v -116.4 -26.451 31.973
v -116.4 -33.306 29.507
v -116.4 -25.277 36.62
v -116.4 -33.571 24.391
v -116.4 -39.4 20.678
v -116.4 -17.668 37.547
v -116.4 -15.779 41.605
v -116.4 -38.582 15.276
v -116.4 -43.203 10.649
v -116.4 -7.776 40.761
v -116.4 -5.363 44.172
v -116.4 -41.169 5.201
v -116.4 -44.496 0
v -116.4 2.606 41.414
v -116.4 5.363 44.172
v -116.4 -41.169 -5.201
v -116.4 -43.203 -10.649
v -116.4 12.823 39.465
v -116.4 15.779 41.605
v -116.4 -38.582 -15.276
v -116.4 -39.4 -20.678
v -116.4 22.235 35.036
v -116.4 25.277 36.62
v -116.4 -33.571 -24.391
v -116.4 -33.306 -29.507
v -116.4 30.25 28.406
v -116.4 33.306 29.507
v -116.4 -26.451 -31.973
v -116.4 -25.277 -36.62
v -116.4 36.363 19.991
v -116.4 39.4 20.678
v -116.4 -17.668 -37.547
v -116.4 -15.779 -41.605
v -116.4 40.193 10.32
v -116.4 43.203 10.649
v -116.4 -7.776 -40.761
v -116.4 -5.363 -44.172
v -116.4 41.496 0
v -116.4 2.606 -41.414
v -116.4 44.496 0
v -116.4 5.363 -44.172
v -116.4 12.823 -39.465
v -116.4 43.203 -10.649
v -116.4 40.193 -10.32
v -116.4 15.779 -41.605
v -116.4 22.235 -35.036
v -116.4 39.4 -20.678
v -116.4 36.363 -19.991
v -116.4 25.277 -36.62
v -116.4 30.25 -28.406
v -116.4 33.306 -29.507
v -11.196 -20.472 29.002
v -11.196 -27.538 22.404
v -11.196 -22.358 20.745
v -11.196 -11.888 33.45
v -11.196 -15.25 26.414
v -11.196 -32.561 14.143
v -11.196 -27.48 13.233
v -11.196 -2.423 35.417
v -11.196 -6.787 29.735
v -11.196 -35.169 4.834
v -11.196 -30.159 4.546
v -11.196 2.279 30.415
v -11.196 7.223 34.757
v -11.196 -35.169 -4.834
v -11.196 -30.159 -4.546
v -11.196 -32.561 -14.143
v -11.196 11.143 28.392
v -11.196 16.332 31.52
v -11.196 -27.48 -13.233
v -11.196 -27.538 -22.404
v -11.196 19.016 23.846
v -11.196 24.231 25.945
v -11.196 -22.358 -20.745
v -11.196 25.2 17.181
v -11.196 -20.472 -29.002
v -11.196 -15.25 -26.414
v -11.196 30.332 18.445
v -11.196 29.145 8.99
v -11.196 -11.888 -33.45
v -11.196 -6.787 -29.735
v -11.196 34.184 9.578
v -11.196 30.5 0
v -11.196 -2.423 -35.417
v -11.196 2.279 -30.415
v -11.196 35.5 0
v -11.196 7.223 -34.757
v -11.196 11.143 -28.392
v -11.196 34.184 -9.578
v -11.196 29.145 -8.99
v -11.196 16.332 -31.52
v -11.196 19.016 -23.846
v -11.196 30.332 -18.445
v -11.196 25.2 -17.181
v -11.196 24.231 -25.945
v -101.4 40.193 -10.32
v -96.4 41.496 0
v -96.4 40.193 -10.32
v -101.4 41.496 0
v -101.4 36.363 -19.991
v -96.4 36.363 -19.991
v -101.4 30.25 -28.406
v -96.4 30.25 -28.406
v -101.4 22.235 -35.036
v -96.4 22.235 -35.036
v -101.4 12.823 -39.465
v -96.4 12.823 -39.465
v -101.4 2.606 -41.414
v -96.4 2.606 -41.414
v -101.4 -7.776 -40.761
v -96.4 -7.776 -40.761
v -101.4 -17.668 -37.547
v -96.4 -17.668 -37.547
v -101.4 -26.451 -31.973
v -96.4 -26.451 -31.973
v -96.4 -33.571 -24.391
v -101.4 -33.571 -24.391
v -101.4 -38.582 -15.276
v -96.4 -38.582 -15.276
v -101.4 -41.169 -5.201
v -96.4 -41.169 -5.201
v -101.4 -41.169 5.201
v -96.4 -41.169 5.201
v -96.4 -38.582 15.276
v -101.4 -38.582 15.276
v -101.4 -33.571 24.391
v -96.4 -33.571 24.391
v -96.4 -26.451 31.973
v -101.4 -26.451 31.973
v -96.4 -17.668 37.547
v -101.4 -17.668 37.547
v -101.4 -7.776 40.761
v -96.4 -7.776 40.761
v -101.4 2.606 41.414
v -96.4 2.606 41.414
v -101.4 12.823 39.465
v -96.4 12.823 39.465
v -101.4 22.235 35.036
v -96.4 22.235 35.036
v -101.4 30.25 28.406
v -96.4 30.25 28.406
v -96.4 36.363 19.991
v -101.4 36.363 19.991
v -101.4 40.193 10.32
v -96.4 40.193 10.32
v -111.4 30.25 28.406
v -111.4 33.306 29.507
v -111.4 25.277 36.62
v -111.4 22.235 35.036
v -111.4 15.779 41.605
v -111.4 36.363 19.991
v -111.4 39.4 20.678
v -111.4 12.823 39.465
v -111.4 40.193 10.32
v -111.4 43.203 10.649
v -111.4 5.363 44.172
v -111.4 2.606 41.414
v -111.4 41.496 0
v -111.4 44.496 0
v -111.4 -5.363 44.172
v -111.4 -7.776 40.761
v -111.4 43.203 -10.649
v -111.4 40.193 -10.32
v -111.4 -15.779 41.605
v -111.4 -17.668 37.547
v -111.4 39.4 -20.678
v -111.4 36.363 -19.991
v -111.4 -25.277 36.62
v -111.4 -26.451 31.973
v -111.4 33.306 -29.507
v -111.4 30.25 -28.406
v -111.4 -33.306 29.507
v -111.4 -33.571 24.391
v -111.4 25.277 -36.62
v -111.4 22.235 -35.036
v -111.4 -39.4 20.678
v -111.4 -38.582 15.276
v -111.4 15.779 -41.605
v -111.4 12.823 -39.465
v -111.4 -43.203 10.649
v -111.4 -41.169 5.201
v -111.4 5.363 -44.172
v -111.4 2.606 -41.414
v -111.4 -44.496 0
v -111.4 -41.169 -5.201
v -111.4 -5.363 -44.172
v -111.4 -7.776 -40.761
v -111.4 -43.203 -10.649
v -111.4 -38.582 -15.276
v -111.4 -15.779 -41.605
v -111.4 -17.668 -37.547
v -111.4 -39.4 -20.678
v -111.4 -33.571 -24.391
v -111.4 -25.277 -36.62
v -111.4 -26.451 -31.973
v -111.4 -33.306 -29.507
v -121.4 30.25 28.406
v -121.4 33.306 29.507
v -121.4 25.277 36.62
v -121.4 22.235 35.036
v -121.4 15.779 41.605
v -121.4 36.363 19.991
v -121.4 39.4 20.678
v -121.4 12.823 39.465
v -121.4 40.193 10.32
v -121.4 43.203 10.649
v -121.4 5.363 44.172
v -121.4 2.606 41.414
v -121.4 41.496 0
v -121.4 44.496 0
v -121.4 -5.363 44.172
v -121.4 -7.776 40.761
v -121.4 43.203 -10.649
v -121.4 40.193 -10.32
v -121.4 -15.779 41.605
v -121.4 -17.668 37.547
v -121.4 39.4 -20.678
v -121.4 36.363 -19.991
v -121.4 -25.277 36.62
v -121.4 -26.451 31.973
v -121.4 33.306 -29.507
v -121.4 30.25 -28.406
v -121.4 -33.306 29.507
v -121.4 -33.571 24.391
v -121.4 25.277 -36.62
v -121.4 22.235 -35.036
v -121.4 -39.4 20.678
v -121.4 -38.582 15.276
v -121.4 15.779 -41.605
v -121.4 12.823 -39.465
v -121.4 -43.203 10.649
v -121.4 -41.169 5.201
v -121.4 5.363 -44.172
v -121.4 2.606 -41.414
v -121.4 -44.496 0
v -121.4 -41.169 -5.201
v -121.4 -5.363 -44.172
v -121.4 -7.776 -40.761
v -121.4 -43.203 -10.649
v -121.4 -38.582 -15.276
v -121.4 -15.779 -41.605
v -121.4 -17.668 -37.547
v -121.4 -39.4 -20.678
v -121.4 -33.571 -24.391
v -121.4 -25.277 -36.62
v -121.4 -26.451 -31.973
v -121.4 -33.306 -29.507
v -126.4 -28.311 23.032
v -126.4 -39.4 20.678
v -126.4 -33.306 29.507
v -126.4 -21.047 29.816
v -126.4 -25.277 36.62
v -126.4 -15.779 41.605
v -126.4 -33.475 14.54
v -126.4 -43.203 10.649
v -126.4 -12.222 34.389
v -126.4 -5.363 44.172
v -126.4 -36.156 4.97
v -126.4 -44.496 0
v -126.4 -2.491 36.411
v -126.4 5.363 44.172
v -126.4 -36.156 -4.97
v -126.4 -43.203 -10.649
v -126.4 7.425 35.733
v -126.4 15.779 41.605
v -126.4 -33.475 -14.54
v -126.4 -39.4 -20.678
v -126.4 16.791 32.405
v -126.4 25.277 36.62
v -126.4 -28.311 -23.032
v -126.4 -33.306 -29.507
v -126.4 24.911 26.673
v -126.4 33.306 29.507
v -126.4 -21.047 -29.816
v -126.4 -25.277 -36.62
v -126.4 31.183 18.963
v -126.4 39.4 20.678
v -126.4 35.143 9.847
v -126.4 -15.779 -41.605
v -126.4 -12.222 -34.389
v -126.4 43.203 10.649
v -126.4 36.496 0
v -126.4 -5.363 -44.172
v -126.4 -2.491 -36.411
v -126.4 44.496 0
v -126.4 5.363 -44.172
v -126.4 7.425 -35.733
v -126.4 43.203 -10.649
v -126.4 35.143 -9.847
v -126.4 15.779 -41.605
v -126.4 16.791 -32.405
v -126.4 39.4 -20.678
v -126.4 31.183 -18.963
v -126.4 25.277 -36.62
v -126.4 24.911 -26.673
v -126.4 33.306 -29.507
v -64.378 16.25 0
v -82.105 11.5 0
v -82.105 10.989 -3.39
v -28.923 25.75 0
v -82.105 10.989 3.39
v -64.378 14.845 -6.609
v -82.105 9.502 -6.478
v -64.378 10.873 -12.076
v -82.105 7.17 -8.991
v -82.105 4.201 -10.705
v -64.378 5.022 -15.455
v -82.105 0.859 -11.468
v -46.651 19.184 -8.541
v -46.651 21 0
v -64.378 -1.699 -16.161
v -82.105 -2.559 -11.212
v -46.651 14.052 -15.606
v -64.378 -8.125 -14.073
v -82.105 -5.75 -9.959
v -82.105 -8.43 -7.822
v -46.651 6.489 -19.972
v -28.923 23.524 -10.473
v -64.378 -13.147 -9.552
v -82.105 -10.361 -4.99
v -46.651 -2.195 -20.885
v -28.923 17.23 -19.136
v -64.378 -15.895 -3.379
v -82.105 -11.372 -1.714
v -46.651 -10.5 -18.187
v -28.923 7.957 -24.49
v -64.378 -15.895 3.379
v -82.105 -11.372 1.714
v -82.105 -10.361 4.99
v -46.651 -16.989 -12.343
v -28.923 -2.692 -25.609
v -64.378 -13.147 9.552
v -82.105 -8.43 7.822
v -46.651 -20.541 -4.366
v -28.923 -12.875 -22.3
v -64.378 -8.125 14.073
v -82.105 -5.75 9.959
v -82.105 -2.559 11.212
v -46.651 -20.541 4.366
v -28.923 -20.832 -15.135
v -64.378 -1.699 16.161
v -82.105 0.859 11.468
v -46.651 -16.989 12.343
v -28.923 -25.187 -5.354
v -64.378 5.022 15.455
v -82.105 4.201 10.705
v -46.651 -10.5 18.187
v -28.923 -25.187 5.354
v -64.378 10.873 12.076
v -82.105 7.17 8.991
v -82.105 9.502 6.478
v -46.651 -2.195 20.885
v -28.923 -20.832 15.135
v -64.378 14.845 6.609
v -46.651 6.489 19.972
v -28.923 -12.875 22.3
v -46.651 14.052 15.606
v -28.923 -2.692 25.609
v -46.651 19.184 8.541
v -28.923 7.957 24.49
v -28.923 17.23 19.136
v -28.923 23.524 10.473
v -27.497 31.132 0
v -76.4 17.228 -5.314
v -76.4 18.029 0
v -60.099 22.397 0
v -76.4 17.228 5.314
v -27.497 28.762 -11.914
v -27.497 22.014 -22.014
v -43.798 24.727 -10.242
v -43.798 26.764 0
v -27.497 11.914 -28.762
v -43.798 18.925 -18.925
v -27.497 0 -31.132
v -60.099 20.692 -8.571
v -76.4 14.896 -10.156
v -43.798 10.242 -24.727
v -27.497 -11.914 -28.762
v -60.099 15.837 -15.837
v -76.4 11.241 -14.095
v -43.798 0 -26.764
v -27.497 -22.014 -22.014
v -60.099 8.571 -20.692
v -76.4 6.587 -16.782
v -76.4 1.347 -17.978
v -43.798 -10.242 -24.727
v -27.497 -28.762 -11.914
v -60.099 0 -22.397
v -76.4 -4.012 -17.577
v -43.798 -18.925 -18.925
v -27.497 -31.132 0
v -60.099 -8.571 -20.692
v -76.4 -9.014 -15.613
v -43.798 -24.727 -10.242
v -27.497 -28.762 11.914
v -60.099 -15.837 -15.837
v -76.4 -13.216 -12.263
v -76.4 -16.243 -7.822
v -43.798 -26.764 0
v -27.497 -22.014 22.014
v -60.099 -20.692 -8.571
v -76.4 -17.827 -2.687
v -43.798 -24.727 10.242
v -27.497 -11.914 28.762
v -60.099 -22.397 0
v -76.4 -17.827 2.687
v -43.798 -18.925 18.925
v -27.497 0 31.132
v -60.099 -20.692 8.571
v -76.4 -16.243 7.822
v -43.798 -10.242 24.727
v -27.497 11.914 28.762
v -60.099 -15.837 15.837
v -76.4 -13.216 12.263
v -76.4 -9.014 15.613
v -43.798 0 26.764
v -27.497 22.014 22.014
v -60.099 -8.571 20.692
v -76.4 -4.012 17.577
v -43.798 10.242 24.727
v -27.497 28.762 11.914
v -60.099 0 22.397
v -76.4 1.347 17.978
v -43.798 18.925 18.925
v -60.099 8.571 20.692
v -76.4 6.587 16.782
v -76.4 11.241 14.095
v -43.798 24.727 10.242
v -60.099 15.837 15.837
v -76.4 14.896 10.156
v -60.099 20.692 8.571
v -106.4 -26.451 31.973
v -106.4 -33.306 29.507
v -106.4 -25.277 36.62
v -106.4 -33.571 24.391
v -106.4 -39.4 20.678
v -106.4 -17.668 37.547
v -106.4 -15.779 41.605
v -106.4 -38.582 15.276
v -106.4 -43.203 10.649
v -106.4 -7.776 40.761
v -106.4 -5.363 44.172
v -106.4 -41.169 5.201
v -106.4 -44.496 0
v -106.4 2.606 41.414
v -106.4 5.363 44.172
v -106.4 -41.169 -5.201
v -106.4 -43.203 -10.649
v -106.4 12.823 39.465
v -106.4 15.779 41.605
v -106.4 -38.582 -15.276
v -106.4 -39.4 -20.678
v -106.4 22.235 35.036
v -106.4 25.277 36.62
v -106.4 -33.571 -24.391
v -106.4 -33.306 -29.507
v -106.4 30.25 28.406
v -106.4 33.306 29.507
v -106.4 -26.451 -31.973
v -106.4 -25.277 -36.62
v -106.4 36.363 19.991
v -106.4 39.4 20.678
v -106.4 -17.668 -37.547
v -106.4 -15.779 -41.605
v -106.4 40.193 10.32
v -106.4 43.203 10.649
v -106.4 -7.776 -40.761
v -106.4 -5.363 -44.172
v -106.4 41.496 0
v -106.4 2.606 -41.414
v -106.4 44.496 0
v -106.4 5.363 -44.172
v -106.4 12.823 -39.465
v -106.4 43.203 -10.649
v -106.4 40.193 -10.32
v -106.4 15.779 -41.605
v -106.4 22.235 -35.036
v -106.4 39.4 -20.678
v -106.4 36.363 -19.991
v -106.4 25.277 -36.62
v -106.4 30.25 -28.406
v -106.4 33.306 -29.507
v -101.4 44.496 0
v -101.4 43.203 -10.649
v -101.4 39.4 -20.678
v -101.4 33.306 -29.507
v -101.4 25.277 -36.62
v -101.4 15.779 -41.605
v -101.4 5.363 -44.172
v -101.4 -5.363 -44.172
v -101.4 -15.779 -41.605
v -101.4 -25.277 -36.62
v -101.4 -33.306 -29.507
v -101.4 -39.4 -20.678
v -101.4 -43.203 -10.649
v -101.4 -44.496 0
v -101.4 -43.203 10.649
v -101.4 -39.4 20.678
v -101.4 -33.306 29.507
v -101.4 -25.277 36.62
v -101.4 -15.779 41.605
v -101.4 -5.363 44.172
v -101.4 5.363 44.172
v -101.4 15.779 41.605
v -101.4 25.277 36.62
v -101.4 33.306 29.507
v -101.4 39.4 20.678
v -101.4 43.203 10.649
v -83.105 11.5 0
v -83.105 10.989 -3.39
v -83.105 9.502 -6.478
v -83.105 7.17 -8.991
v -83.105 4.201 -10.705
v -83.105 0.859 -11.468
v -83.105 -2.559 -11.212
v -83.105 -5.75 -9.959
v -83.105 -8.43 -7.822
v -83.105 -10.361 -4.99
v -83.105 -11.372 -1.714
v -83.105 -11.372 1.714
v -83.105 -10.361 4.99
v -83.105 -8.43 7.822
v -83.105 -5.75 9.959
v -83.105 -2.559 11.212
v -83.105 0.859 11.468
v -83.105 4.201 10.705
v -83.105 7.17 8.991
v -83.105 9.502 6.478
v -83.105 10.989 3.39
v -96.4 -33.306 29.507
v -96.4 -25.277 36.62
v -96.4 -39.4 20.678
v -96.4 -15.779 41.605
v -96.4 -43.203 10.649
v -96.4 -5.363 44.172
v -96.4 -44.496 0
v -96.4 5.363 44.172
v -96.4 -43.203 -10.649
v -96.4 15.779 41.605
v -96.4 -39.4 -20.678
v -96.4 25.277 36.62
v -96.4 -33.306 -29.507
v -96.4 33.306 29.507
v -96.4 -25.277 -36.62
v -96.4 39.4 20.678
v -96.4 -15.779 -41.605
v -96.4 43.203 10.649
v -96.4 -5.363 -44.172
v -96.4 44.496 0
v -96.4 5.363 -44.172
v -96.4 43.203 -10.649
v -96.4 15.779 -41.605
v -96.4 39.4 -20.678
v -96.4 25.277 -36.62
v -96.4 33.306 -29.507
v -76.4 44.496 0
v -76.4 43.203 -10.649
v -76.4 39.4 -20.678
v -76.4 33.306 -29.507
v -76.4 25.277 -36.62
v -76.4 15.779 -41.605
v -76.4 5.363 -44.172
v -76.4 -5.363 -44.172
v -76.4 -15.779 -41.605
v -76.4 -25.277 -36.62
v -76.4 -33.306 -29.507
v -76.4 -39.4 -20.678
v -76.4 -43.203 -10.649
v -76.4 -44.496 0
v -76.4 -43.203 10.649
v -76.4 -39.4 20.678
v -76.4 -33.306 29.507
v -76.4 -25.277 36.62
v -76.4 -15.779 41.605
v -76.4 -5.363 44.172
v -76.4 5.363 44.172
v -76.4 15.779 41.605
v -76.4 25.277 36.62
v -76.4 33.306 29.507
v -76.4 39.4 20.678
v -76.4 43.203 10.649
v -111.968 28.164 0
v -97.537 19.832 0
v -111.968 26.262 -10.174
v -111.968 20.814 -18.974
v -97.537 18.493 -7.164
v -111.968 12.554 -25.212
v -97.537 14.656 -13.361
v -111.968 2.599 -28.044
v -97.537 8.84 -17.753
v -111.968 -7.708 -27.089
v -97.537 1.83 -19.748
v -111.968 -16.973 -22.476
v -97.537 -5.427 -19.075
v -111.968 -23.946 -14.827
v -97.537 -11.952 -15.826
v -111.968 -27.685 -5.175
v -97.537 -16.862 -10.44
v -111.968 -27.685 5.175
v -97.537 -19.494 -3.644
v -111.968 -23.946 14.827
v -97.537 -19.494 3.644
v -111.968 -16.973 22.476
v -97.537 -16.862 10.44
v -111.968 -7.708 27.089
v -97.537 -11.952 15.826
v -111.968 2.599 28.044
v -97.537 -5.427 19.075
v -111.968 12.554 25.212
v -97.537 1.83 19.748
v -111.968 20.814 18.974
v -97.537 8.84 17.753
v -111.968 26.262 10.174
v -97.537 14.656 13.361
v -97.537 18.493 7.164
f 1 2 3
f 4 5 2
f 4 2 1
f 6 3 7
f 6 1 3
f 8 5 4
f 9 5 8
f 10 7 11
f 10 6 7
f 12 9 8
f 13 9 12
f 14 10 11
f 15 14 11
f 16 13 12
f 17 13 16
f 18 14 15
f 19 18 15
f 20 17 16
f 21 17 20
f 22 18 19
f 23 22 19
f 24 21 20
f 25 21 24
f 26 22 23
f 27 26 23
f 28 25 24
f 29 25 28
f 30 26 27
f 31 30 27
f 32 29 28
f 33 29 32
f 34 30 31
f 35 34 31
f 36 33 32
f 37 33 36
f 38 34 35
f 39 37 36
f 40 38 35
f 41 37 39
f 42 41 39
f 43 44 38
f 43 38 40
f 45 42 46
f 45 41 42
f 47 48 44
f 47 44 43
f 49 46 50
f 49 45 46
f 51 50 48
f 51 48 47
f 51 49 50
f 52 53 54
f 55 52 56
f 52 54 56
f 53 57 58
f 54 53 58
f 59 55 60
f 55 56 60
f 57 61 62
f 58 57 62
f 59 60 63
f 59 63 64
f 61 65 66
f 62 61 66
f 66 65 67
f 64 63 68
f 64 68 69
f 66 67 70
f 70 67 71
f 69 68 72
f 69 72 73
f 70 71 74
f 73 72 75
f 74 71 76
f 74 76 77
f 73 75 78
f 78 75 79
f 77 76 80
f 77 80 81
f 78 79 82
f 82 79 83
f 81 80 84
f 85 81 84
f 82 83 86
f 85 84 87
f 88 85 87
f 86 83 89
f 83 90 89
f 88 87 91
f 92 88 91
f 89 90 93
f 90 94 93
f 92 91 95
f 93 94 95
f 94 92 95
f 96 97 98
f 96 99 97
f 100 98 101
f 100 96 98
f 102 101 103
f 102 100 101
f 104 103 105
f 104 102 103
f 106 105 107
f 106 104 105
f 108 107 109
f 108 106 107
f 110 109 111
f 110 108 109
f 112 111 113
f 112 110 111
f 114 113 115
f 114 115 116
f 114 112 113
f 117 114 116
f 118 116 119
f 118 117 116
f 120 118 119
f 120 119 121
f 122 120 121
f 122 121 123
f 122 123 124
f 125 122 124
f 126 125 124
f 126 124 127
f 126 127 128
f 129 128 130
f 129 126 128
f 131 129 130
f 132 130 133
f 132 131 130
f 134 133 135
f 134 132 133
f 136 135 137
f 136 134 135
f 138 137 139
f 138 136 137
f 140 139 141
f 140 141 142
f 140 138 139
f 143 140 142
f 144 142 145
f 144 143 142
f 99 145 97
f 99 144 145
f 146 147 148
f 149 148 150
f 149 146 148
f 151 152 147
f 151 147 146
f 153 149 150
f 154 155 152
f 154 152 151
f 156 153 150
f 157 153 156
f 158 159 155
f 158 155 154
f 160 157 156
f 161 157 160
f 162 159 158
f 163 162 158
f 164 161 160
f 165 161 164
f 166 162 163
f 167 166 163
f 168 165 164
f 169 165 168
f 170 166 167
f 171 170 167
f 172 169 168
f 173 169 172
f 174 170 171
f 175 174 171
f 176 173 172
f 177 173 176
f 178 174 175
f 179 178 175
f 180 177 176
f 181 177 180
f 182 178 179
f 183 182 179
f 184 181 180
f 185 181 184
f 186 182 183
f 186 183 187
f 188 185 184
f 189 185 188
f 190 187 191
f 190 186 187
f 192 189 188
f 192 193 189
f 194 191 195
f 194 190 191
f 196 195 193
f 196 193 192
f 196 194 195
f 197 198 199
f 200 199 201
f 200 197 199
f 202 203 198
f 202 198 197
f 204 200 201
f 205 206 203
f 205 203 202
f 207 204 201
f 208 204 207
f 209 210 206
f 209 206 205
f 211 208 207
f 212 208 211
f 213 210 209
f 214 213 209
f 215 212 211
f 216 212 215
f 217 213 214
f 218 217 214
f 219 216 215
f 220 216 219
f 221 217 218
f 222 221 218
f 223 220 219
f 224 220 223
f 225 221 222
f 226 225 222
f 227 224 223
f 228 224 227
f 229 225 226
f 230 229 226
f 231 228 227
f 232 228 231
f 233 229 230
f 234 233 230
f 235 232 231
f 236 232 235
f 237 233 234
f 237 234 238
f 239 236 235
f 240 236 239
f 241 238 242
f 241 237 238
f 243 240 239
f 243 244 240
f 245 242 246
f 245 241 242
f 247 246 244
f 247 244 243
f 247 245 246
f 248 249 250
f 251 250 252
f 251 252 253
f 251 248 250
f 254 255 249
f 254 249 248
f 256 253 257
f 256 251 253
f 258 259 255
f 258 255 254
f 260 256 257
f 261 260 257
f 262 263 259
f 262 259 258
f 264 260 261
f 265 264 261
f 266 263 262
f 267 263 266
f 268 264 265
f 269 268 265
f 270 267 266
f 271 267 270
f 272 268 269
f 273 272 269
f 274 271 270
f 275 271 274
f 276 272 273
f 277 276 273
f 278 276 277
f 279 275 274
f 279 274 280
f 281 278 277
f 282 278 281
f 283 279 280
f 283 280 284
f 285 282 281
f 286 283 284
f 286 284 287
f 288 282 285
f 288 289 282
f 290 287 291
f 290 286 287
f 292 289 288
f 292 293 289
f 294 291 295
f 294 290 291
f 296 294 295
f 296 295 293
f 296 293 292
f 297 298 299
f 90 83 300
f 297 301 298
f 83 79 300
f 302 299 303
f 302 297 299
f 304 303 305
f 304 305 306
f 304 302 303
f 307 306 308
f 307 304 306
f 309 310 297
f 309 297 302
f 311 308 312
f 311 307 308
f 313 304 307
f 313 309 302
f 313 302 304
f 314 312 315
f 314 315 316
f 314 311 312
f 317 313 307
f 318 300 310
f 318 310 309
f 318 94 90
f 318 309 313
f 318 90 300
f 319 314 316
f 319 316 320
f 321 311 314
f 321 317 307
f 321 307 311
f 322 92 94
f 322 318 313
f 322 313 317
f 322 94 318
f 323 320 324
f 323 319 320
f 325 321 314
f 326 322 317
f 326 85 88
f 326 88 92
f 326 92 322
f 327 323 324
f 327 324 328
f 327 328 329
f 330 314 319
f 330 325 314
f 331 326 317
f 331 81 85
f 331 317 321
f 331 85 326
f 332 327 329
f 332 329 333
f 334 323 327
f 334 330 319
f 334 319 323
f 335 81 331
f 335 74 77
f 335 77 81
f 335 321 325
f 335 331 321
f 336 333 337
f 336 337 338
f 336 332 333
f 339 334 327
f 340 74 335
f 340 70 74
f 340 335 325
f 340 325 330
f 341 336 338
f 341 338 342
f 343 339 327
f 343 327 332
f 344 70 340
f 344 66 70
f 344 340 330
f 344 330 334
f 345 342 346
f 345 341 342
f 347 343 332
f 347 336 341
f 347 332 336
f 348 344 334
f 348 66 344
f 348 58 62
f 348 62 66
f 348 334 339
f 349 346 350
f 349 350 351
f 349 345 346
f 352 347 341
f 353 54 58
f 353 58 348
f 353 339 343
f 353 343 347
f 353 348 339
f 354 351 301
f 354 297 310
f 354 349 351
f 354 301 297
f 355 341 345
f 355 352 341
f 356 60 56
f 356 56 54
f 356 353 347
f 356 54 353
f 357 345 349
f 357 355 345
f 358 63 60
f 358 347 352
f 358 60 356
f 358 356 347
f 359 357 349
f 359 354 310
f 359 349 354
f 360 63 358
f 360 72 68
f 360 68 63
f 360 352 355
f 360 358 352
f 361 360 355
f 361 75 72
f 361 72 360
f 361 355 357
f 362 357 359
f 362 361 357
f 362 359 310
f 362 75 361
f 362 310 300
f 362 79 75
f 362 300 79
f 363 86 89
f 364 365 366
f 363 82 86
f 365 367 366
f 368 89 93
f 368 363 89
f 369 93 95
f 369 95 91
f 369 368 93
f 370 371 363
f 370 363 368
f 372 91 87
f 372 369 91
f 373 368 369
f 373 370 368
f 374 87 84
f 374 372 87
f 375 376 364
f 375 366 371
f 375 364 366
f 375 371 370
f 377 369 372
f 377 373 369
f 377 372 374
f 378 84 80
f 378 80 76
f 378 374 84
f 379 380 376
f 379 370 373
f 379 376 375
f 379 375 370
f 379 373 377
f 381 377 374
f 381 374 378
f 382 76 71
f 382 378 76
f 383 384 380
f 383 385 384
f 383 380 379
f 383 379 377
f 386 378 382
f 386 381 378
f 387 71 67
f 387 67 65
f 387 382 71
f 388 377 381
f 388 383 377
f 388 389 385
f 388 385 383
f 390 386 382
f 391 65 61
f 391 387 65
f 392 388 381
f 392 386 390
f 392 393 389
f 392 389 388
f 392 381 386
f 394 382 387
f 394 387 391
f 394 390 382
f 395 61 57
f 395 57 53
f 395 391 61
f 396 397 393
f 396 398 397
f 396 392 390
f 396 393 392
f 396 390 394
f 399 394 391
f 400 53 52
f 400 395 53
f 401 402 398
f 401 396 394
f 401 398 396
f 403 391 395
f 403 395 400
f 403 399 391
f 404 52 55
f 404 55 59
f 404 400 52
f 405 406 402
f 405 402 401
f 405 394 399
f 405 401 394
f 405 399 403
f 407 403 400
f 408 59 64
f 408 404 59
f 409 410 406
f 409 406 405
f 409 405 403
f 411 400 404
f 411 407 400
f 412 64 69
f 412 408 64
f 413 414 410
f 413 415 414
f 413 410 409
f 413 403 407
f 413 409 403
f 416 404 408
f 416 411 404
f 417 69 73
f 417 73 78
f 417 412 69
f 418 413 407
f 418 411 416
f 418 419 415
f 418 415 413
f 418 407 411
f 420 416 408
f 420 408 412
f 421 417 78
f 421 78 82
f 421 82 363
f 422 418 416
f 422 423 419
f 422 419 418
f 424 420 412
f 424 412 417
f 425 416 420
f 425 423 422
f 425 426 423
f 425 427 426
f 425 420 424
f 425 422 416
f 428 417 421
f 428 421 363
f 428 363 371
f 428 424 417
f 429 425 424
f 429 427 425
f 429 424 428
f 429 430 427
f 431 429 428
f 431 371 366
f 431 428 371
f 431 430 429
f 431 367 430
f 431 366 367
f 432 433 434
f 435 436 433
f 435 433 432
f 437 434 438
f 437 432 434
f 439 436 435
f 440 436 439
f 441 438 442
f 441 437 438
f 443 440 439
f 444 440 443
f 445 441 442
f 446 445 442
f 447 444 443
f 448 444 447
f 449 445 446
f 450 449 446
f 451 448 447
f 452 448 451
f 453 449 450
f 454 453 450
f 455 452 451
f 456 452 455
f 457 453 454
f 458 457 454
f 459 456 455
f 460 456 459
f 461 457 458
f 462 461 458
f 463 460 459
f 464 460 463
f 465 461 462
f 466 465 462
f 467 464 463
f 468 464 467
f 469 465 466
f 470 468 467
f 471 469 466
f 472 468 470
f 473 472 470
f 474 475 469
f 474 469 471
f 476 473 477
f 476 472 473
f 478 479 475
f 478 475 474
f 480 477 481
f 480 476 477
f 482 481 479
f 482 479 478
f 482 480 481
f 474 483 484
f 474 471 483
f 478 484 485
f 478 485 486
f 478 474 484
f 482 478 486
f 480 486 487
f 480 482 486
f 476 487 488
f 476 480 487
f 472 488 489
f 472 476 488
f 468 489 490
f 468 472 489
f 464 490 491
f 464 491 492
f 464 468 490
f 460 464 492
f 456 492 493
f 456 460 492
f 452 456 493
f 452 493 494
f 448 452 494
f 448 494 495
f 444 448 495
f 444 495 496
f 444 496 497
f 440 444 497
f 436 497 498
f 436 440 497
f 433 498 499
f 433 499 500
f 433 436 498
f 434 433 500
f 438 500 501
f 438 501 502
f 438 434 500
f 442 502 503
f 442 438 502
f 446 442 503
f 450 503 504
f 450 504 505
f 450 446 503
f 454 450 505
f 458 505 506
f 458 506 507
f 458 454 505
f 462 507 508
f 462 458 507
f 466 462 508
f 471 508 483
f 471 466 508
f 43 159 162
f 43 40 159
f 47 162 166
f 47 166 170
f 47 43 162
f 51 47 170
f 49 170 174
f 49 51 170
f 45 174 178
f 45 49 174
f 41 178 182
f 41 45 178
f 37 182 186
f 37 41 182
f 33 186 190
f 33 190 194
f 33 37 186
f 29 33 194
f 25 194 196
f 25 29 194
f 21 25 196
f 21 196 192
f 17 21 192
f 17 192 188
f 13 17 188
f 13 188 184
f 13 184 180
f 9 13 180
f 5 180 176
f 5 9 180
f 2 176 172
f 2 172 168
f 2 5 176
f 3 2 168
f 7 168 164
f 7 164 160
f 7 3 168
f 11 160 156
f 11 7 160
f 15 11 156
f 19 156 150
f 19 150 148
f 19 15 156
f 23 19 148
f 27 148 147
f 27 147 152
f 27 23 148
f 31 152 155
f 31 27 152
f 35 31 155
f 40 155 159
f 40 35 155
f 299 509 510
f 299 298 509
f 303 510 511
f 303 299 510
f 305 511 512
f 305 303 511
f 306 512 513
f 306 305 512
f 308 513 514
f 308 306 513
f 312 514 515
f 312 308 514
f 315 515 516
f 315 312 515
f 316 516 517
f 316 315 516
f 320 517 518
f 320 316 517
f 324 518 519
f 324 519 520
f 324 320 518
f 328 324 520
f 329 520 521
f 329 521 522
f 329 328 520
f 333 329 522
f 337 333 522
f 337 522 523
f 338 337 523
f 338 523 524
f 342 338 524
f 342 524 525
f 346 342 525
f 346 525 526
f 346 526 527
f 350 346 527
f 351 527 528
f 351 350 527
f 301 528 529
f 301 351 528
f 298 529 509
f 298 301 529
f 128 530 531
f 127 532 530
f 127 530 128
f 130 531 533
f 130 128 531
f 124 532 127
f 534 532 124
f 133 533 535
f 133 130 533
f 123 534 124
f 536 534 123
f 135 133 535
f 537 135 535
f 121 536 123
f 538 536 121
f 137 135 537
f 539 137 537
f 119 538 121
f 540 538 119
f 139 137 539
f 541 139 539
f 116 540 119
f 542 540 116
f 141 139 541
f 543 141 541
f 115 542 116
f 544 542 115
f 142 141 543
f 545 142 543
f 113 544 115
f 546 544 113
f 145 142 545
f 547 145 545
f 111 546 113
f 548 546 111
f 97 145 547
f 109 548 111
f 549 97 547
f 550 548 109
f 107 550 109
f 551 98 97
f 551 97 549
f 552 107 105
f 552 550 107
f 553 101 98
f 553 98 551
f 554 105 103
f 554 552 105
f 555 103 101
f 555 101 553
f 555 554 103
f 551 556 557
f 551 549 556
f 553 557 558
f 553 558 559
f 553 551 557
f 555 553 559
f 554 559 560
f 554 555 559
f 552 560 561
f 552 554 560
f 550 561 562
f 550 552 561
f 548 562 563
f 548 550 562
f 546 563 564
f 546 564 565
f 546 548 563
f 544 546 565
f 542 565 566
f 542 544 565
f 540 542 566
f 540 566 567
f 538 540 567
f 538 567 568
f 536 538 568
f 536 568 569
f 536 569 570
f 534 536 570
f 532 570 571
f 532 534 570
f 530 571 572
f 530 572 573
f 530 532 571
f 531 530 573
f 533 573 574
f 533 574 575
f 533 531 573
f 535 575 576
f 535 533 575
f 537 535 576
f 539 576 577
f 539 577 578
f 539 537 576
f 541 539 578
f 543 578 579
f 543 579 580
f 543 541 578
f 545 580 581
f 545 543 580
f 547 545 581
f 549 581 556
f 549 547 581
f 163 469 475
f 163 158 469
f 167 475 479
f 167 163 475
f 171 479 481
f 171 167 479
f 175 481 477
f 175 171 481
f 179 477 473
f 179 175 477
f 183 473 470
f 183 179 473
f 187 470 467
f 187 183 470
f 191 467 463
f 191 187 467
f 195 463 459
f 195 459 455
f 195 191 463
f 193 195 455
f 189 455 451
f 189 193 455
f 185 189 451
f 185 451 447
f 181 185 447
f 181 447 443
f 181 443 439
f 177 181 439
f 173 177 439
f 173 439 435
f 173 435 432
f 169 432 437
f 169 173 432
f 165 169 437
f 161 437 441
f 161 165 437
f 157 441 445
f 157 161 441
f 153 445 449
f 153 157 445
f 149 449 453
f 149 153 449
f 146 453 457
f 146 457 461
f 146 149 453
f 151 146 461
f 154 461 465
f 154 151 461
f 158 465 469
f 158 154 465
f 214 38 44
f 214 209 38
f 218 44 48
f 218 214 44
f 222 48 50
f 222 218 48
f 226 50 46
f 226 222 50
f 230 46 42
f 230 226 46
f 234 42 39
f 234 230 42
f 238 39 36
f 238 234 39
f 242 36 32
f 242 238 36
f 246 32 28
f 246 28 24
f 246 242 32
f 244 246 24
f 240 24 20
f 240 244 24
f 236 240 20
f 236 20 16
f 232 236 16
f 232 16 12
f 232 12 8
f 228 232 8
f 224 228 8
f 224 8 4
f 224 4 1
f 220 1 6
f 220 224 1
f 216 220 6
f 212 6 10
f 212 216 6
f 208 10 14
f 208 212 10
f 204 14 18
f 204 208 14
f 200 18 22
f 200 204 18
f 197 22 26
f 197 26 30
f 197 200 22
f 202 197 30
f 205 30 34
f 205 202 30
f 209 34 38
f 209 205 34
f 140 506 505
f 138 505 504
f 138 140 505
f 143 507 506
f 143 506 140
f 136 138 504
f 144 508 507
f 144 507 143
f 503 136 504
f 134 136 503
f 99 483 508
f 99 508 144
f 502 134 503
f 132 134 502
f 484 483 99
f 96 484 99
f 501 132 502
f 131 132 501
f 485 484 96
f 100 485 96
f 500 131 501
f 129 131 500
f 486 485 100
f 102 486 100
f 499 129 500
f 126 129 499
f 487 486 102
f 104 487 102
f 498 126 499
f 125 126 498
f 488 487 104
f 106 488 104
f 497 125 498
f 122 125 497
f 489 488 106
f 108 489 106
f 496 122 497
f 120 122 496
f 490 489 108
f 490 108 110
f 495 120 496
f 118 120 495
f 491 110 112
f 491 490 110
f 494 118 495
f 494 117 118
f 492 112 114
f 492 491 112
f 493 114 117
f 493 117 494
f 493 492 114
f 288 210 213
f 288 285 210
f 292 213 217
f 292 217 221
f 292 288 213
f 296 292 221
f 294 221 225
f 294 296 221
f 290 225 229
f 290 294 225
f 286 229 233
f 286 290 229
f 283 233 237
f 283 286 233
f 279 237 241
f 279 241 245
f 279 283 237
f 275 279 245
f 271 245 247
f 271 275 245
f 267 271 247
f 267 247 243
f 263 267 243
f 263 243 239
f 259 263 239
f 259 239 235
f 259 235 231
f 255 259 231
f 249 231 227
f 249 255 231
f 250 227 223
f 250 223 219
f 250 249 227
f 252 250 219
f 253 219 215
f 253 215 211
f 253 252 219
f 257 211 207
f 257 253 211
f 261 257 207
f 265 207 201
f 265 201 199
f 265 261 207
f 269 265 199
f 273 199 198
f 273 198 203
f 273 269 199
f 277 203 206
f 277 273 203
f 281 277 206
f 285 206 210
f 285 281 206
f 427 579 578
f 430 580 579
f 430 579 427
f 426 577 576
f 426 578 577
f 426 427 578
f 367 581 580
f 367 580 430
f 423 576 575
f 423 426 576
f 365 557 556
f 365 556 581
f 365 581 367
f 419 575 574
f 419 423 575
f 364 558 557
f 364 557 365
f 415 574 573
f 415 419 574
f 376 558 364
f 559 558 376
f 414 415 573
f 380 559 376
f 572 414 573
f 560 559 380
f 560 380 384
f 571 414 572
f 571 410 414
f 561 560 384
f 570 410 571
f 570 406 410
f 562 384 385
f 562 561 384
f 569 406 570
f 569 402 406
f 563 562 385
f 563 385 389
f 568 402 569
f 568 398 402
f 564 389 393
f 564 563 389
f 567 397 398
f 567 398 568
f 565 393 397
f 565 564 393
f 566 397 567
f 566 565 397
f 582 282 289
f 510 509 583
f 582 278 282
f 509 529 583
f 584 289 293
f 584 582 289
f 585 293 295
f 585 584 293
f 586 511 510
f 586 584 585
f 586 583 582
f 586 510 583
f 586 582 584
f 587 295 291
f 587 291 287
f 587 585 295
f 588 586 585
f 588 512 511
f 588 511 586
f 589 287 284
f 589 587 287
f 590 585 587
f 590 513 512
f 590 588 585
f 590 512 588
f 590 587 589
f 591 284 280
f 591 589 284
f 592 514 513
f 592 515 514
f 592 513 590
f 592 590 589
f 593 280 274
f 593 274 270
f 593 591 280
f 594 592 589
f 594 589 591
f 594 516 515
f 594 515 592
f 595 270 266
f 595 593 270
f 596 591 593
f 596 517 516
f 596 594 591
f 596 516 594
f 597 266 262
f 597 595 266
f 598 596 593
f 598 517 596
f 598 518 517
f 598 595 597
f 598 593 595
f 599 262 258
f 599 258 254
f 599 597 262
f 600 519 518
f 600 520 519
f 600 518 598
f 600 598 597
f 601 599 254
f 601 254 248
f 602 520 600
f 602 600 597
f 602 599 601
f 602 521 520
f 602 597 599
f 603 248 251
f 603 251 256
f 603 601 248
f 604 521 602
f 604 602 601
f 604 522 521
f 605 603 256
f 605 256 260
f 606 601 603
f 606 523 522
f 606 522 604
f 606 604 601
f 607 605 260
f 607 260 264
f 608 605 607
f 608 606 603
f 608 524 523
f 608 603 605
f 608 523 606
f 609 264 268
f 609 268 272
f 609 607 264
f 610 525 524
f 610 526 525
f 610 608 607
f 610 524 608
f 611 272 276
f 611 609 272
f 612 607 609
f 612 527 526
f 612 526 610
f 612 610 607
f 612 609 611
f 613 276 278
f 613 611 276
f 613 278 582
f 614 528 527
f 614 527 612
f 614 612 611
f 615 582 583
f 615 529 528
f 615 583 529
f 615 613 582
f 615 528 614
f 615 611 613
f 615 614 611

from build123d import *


with BuildPart() as part:
    # Sketch1 → Revolve1 (revolve)
    with BuildSketch(Plane.XY):
        Polygon((-82.105117767, 11.5), (0, 33.5), (0, 38.5), (-76.4, 18.028681698), (-76.4, 44.496311912), (-96.4, 44.496311912), (-96.4, 41.496311912), (-101.4, 41.496311912), (-101.4, 44.496311912), (-106.4, 44.496311912), (-106.4, 41.496311912), (-111.4, 41.496311912), (-111.4, 44.496311912), (-116.4, 44.496311912), (-116.4, 41.496311912), (-121.4, 41.496311912), (-121.4, 44.496311912), (-126.4, 44.496311912), (-126.4, 36.496311912), (-83.105117767, 11.5), align=None)
    revolve(axis=Axis((0, 0, 0), (-1, 0, 0)))

    # Sketch2 → Cut-Revolve1 (revolve, cut)
    with BuildSketch(Plane.XY):
        Polygon((-11.196152423, 0), (-11.196152423, 35.5), (-11.196152423, 56.271944123), (14.531335426, 56.271944123), (14.531335426, 0), align=None)
    revolve(axis=Axis((0, 0, 0), (-1, 0, 0)), mode=Mode.SUBTRACT)


solid = part.part
